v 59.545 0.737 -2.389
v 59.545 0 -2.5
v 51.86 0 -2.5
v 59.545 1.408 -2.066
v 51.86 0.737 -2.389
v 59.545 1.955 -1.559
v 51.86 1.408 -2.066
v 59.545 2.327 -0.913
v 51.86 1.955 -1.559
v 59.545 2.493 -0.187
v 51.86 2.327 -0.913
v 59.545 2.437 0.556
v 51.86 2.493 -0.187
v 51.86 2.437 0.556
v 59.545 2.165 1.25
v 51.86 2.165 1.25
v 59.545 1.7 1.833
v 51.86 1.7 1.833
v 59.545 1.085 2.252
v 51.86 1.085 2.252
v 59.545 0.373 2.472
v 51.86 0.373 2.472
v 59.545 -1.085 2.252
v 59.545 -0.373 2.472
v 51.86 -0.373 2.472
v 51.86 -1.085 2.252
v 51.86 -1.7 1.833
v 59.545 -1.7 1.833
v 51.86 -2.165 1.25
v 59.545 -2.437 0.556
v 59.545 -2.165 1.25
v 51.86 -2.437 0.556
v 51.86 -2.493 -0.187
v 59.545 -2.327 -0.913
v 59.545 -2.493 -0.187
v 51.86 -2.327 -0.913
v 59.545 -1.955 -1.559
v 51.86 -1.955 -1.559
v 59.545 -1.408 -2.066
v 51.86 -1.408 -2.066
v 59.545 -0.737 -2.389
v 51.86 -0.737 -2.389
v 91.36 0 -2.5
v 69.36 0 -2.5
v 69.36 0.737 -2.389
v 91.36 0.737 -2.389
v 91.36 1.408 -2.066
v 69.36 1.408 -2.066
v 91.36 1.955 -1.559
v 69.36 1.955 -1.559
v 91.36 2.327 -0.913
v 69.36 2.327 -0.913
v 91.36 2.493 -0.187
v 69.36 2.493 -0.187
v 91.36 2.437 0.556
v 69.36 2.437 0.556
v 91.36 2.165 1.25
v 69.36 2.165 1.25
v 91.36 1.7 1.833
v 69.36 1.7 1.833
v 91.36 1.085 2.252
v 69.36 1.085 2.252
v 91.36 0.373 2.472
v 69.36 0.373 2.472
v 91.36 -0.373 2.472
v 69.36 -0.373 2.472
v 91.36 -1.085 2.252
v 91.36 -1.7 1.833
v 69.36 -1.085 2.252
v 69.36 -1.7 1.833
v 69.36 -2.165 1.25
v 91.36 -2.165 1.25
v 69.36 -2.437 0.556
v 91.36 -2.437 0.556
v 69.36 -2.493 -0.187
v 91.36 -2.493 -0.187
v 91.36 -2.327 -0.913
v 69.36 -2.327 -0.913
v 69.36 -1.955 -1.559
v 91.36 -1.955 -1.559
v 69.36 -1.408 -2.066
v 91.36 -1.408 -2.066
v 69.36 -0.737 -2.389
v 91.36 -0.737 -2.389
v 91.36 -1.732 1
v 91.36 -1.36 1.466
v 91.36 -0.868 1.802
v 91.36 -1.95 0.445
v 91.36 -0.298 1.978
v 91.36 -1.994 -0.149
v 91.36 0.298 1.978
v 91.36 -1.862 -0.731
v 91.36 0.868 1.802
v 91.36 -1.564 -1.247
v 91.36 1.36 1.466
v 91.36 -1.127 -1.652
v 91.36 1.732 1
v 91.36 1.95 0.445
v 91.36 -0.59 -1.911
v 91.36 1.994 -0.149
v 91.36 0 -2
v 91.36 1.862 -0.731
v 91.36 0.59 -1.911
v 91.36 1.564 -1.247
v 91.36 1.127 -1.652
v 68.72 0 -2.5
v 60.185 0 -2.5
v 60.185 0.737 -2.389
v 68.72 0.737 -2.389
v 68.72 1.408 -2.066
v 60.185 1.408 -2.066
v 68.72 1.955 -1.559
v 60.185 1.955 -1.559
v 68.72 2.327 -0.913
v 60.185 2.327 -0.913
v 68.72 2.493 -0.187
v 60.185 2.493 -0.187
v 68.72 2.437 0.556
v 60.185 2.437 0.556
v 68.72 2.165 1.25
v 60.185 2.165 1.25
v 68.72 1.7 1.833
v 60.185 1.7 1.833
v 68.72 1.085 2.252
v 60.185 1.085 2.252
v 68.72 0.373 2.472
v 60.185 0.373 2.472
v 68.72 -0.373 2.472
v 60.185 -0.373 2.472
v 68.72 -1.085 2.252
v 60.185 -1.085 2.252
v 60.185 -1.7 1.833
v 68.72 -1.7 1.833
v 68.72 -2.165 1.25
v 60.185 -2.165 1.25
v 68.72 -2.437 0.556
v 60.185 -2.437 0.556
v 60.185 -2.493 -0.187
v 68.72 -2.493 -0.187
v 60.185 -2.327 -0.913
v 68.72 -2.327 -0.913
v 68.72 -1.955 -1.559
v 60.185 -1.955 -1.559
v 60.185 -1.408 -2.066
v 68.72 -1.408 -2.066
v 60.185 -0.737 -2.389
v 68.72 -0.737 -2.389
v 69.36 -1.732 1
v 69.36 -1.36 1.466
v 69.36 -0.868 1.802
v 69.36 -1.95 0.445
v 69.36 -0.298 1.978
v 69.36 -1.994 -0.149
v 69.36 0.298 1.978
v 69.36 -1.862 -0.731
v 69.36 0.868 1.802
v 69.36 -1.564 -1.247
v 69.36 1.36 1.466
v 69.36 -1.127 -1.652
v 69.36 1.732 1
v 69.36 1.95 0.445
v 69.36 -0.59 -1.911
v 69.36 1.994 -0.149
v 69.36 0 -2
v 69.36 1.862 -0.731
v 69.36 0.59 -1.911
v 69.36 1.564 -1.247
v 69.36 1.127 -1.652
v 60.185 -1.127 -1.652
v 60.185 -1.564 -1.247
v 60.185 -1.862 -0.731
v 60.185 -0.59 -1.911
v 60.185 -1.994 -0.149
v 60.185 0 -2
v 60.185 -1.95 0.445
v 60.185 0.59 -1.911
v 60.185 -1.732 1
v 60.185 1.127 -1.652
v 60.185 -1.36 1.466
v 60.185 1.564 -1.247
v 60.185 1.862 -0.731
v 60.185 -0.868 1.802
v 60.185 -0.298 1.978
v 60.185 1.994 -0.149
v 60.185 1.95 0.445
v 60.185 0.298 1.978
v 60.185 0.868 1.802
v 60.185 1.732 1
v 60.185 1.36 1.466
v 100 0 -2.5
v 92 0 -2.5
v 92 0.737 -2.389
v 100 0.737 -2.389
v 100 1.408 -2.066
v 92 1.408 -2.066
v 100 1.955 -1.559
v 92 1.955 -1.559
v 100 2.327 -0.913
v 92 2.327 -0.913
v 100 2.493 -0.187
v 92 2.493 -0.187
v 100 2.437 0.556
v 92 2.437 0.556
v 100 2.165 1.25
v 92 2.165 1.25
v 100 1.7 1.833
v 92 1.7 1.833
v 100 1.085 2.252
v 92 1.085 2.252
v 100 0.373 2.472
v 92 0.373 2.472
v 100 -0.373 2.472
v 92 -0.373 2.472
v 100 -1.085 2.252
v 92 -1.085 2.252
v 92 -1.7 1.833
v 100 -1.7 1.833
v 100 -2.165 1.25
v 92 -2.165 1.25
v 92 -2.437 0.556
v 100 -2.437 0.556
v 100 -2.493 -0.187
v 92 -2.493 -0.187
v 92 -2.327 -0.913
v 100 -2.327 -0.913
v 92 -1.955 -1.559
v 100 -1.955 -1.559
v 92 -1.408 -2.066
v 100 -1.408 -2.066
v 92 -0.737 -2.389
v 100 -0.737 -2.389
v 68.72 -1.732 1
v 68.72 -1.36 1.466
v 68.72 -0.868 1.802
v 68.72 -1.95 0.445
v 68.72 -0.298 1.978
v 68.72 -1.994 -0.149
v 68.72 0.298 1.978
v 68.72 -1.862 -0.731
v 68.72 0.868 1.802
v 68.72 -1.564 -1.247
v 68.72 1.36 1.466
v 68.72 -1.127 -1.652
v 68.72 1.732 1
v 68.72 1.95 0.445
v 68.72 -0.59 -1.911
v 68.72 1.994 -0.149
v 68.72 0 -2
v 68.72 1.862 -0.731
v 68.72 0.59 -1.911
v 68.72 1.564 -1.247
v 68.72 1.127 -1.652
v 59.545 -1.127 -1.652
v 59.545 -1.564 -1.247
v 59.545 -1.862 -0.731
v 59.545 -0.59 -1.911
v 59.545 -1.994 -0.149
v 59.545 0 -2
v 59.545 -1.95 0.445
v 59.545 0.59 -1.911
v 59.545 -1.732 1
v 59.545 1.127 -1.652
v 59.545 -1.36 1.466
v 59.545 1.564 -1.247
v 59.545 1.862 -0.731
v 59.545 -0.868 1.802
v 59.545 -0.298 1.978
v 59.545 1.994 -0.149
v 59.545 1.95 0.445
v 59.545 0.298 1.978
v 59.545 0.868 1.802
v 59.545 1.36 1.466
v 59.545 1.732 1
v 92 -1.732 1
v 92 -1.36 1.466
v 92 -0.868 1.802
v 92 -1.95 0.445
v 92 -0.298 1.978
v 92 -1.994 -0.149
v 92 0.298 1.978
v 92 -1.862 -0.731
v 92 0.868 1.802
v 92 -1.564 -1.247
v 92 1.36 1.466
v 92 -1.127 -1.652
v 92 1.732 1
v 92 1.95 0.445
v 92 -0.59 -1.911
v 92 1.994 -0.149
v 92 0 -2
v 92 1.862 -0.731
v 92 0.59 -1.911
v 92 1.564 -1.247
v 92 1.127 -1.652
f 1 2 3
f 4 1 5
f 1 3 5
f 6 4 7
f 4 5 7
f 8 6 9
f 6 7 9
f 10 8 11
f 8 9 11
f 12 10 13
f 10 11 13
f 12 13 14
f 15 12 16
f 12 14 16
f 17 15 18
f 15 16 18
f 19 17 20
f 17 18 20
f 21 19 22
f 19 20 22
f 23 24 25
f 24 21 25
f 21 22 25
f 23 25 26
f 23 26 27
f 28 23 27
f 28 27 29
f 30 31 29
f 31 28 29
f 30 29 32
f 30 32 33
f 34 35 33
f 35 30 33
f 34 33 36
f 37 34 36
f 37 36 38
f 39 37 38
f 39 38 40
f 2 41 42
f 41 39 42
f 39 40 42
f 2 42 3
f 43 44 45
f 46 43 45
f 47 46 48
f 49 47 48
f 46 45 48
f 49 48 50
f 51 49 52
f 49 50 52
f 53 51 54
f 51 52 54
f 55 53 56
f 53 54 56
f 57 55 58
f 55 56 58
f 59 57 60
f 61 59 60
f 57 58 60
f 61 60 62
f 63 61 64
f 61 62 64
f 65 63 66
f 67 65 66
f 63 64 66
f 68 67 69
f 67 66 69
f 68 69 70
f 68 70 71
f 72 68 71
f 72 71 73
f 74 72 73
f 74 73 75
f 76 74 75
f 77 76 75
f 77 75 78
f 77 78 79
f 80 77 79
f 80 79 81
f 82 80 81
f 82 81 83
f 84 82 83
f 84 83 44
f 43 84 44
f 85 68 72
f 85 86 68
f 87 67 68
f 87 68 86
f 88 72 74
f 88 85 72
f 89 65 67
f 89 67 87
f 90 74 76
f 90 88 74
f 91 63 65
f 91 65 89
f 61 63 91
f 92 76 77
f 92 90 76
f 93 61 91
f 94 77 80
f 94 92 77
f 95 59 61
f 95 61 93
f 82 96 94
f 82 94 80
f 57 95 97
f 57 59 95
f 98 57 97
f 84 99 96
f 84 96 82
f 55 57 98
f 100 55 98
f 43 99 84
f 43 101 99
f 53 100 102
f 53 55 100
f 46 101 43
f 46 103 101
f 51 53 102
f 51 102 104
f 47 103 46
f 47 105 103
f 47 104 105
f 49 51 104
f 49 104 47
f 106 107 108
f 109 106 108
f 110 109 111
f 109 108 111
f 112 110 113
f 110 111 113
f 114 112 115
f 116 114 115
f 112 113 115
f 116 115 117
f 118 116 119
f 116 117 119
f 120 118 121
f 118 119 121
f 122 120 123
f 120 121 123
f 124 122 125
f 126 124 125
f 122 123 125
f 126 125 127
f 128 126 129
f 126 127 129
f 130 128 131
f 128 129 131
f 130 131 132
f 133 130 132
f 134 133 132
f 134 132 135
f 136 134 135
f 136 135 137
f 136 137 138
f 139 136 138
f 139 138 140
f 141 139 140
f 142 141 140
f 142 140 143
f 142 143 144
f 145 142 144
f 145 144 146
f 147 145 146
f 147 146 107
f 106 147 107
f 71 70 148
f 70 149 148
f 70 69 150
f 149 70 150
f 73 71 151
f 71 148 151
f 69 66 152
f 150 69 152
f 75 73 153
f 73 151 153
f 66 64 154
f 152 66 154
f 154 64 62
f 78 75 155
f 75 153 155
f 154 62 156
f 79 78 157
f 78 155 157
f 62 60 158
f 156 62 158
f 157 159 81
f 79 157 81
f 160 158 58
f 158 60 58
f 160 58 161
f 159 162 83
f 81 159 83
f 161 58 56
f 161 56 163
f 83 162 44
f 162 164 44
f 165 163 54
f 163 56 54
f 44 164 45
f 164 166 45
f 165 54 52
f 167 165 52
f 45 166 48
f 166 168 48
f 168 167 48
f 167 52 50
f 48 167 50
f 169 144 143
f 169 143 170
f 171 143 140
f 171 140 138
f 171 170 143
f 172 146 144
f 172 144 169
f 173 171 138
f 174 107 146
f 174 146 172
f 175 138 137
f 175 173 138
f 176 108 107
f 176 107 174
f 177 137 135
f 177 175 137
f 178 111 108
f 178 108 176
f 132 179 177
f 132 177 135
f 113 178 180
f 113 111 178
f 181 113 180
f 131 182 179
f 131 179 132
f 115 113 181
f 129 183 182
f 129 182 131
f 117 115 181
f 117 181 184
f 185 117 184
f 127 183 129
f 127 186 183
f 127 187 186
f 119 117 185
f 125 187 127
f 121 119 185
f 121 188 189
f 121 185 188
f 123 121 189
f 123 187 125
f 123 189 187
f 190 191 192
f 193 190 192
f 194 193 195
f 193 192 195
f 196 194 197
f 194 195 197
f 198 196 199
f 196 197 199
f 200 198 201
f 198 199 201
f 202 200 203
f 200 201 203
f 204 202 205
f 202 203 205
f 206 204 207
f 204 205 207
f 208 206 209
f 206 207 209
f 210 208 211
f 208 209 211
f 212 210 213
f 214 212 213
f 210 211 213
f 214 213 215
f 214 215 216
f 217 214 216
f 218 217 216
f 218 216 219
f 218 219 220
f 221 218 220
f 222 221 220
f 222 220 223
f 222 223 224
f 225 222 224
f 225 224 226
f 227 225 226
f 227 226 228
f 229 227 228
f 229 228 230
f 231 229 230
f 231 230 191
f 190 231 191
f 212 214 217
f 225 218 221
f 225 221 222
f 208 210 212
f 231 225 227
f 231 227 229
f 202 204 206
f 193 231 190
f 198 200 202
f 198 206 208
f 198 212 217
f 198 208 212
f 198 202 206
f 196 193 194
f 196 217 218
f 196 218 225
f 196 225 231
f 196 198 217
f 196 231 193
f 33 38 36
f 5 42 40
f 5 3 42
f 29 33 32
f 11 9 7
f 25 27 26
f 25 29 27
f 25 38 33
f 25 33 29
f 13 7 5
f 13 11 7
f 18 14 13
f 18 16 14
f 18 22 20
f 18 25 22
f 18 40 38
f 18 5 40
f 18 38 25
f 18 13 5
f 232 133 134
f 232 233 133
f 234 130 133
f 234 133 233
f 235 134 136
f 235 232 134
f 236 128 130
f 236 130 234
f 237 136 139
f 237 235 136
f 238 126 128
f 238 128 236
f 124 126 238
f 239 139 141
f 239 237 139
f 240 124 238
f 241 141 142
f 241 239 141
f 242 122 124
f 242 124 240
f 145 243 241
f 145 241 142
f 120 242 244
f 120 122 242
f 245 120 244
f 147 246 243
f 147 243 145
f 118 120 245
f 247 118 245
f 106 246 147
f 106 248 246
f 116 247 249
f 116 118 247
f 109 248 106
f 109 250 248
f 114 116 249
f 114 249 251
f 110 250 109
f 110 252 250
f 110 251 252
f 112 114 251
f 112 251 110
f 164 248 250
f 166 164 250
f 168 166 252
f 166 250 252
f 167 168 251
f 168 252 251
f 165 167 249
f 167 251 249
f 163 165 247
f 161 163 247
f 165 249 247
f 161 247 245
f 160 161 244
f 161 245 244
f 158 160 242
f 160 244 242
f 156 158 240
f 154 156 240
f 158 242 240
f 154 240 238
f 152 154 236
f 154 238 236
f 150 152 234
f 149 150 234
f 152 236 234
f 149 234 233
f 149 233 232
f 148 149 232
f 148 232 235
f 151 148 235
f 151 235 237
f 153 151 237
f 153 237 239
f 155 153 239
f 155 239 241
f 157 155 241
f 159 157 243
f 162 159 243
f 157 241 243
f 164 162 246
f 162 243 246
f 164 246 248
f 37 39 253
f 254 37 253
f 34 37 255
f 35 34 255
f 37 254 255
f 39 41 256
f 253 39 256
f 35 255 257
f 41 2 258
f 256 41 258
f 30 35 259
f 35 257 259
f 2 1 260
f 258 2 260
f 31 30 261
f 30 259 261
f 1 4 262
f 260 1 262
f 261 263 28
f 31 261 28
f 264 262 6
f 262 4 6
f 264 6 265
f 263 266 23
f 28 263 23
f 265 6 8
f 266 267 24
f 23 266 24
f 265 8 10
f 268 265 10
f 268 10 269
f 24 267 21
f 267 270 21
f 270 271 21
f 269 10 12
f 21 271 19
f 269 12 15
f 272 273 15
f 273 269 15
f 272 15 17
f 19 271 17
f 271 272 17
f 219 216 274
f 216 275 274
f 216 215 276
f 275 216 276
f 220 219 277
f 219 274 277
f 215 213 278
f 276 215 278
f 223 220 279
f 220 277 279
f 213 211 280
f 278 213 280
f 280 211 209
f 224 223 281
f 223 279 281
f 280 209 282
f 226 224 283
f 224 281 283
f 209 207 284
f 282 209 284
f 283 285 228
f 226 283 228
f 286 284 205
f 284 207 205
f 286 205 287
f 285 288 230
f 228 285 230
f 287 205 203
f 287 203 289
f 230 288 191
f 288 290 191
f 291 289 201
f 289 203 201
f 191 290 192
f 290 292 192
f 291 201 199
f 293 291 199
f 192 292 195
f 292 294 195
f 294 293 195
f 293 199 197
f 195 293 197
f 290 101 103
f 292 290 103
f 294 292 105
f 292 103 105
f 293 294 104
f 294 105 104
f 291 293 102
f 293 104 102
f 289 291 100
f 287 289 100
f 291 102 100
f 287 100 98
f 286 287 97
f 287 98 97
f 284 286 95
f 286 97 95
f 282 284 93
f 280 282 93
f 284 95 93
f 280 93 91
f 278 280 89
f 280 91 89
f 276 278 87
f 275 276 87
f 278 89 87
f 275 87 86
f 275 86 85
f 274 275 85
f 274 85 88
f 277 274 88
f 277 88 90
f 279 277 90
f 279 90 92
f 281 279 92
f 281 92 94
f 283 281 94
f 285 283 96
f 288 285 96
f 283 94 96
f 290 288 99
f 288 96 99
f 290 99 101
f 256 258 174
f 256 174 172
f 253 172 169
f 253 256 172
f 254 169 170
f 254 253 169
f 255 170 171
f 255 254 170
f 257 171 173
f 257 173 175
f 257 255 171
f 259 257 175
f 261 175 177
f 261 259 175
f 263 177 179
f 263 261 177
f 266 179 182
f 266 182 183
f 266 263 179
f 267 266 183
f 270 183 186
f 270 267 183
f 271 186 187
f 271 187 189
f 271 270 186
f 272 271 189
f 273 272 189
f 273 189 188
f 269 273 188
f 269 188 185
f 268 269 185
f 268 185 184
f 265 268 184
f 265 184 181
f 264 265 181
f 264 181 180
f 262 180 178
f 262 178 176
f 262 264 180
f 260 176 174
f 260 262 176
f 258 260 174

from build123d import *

# Parameters (mm, degrees)
SKETCH1_R           = 2.5
BOSS_EXTRUDE1_DEPTH = 100
CUT_EXTRUDE1_START  = -0.64
SKETCH2_R           = 2.5
SKETCH2_R_2         = 2
CUT_EXTRUDE1_DEPTH  = 0.64
CUT_EXTRUDE2_START  = -0.64
SKETCH3_R           = 2.5
SKETCH3_R_2         = 2
CUT_EXTRUDE2_DEPTH  = 0.64
CUT_EXTRUDE3_START  = 51.86
SKETCH4_R           = 2.5
CUT_EXTRUDE3_DEPTH  = 51.86
CUT_EXTRUDE4_START  = 0.64
SKETCH6_R           = 2.5
SKETCH6_R_2         = 2
CUT_EXTRUDE4_DEPTH  = 0.64


with BuildPart() as part:
    # Sketch1 → Boss-Extrude1 (new body)
    with BuildSketch(Plane(origin=(0, 0, 0), x_dir=(0, 0, -1), z_dir=(1, 0, 0))):
        Circle(SKETCH1_R)
    extrude(amount=BOSS_EXTRUDE1_DEPTH)

    # Sketch2 → Cut-Extrude1 (cut)
    with BuildSketch(Plane(origin=(92, 0, 0), x_dir=(0, 0, -1), z_dir=(1, 0, 0)).offset(CUT_EXTRUDE1_START)):
        Circle(SKETCH2_R)
        Circle(SKETCH2_R_2, mode=Mode.SUBTRACT)
    extrude(amount=CUT_EXTRUDE1_DEPTH, mode=Mode.SUBTRACT)

    # Sketch3 → Cut-Extrude2 (cut)
    with BuildSketch(Plane(origin=(69.36, 0, 0), x_dir=(0, 0, -1), z_dir=(1, 0, 0)).offset(CUT_EXTRUDE2_START)):
        Circle(SKETCH3_R)
        Circle(SKETCH3_R_2, mode=Mode.SUBTRACT)
    extrude(amount=CUT_EXTRUDE2_DEPTH, mode=Mode.SUBTRACT)

    # Sketch4 → Cut-Extrude3 (cut)
    with BuildSketch(Plane.ZY.offset(-51.86).offset(CUT_EXTRUDE3_START)):
        Circle(SKETCH4_R)
    extrude(amount=-CUT_EXTRUDE3_DEPTH, mode=Mode.SUBTRACT)

    # Sketch6 → Cut-Extrude4 (cut)
    with BuildSketch(Plane.ZY.offset(-60.185).offset(CUT_EXTRUDE4_START)):
        Circle(SKETCH6_R)
        with Locations(Location((0, 0, 0), (0, 0, 180))):
            Circle(SKETCH6_R_2, mode=Mode.SUBTRACT)
    extrude(amount=-CUT_EXTRUDE4_DEPTH, mode=Mode.SUBTRACT)


solid = part.part
